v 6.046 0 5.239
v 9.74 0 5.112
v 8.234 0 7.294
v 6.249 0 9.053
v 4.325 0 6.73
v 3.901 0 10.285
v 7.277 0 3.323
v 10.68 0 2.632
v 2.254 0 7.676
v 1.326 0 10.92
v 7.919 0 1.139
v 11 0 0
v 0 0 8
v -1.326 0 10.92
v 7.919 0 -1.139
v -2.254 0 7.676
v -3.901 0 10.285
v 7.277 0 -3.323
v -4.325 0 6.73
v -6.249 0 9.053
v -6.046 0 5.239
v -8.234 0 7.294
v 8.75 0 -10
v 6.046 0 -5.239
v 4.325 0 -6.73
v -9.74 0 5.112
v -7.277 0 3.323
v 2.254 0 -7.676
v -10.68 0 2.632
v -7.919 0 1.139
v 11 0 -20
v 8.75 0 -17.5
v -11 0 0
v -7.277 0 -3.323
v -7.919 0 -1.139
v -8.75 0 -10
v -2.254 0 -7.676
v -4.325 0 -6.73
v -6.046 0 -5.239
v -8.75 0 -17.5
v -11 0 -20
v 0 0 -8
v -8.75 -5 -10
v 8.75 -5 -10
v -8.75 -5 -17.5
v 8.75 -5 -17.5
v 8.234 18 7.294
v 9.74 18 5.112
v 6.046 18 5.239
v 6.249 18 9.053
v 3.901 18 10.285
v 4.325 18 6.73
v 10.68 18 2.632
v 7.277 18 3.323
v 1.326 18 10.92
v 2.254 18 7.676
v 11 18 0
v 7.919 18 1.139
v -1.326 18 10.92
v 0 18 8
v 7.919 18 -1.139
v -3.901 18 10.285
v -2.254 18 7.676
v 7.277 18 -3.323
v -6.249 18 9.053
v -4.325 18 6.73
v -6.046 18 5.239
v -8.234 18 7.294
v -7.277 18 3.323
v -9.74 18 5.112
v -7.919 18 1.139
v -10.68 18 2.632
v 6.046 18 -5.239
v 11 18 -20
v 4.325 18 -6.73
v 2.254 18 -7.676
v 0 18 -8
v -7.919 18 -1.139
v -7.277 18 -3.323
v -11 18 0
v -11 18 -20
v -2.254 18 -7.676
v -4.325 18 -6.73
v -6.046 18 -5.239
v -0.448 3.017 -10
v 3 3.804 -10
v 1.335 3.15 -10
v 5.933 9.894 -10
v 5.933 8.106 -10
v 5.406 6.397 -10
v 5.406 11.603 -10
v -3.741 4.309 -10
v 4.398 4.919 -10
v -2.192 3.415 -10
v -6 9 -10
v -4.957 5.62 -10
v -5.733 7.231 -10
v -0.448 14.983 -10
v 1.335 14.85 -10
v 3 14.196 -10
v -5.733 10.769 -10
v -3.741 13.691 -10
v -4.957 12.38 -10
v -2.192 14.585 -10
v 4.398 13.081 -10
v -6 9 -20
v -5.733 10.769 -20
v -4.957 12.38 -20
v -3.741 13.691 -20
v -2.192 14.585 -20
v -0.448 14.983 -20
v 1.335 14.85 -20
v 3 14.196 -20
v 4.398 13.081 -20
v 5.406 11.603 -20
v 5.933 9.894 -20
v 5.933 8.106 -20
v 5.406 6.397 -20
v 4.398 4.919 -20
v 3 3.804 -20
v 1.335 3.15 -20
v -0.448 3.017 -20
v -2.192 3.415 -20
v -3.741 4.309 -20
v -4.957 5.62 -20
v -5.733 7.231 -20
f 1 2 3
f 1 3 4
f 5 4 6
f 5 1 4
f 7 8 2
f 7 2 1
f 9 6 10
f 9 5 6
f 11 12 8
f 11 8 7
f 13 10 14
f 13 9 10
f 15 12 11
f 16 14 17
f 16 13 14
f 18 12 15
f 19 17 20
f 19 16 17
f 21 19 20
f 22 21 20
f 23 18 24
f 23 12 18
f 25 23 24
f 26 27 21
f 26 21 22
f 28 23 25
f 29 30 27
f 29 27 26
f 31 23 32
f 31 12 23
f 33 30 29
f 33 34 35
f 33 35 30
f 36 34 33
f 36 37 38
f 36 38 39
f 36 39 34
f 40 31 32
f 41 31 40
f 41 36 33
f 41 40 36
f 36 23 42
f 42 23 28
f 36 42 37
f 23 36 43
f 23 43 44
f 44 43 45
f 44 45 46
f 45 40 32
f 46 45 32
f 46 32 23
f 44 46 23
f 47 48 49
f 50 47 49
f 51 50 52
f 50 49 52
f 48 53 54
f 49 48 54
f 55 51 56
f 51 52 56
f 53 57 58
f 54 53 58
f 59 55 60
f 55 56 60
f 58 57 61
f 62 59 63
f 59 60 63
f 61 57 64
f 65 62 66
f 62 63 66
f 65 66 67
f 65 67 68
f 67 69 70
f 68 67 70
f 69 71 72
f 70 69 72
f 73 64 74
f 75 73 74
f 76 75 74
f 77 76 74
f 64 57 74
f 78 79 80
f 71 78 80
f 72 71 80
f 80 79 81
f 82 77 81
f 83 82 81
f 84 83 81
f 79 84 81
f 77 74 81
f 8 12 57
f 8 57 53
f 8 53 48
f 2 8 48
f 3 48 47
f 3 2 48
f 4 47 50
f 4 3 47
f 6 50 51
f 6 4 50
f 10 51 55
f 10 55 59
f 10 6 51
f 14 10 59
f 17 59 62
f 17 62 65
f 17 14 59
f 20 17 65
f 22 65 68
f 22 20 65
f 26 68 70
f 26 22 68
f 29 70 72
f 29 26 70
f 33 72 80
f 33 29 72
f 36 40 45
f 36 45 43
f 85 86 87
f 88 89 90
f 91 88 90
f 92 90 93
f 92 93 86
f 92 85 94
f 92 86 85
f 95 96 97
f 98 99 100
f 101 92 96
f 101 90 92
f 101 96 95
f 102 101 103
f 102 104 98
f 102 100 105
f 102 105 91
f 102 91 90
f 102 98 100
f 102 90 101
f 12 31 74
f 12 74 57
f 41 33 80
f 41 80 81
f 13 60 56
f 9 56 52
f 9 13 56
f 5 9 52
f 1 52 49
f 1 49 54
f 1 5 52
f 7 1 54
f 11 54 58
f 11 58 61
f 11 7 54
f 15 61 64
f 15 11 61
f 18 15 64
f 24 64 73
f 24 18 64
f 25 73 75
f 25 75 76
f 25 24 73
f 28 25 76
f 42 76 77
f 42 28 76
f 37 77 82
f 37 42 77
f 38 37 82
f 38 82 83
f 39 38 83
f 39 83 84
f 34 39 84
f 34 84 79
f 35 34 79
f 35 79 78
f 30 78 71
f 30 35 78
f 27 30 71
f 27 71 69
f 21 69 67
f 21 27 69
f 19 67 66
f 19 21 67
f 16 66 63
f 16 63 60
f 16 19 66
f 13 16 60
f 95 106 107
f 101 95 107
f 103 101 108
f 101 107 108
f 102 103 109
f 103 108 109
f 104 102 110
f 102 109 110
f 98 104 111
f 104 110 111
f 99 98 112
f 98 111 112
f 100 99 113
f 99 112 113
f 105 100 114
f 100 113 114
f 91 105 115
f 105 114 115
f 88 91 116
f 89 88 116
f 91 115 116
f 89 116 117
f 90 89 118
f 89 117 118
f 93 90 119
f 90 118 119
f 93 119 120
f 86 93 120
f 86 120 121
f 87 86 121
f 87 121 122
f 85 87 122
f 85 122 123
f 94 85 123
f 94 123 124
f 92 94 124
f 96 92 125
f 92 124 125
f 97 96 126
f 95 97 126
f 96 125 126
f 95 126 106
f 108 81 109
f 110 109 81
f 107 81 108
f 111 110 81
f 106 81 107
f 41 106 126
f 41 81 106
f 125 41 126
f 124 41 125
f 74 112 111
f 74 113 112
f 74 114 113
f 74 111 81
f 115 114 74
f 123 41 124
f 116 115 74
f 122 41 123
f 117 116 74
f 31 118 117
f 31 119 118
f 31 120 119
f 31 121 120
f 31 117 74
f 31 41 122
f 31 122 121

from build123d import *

# Parameters (mm, degrees)
SKETCH1_R           = 8
BOSS_EXTRUDE1_DEPTH = 18
SKETCH2_R           = 6
CUT_EXTRUDE1_DEPTH  = 10
SKETCH4_W           = 17.5
SKETCH4_H           = 7.5
BOSS_EXTRUDE3_DEPTH = 5


with BuildPart() as part:
    # Sketch1 → Boss-Extrude1 (new body)
    with BuildSketch(Plane(origin=(0, 0, 0), x_dir=(1, 0, 0), z_dir=(0, 1, 0))):
        with BuildLine():
            Line((-11, 0), (-11, 20))
            Line((-11, 20), (11, 20))
            Line((11, 20), (11, 0))
            ThreePointArc((11, 0), (0, -11), (-11, 0))
        make_face()
        with Locations(Location((0, 0, 0), (0, 0, 270))):
            Circle(SKETCH1_R, mode=Mode.SUBTRACT)
    extrude(amount=BOSS_EXTRUDE1_DEPTH)

    # Sketch2 → Cut-Extrude1 (cut)
    with BuildSketch(Plane(origin=(0, 0, -20), x_dir=(-1, 0, 0), z_dir=(0, 0, -1))):
        with Locations((0, 9)):
            Circle(SKETCH2_R)
    extrude(amount=-CUT_EXTRUDE1_DEPTH, mode=Mode.SUBTRACT)

    # Sketch4 → Boss-Extrude3 (add)
    with BuildSketch(Plane.XZ):
        with Locations((0, -13.75)):
            Rectangle(SKETCH4_W, SKETCH4_H)
    extrude(amount=BOSS_EXTRUDE3_DEPTH)


solid = part.part
